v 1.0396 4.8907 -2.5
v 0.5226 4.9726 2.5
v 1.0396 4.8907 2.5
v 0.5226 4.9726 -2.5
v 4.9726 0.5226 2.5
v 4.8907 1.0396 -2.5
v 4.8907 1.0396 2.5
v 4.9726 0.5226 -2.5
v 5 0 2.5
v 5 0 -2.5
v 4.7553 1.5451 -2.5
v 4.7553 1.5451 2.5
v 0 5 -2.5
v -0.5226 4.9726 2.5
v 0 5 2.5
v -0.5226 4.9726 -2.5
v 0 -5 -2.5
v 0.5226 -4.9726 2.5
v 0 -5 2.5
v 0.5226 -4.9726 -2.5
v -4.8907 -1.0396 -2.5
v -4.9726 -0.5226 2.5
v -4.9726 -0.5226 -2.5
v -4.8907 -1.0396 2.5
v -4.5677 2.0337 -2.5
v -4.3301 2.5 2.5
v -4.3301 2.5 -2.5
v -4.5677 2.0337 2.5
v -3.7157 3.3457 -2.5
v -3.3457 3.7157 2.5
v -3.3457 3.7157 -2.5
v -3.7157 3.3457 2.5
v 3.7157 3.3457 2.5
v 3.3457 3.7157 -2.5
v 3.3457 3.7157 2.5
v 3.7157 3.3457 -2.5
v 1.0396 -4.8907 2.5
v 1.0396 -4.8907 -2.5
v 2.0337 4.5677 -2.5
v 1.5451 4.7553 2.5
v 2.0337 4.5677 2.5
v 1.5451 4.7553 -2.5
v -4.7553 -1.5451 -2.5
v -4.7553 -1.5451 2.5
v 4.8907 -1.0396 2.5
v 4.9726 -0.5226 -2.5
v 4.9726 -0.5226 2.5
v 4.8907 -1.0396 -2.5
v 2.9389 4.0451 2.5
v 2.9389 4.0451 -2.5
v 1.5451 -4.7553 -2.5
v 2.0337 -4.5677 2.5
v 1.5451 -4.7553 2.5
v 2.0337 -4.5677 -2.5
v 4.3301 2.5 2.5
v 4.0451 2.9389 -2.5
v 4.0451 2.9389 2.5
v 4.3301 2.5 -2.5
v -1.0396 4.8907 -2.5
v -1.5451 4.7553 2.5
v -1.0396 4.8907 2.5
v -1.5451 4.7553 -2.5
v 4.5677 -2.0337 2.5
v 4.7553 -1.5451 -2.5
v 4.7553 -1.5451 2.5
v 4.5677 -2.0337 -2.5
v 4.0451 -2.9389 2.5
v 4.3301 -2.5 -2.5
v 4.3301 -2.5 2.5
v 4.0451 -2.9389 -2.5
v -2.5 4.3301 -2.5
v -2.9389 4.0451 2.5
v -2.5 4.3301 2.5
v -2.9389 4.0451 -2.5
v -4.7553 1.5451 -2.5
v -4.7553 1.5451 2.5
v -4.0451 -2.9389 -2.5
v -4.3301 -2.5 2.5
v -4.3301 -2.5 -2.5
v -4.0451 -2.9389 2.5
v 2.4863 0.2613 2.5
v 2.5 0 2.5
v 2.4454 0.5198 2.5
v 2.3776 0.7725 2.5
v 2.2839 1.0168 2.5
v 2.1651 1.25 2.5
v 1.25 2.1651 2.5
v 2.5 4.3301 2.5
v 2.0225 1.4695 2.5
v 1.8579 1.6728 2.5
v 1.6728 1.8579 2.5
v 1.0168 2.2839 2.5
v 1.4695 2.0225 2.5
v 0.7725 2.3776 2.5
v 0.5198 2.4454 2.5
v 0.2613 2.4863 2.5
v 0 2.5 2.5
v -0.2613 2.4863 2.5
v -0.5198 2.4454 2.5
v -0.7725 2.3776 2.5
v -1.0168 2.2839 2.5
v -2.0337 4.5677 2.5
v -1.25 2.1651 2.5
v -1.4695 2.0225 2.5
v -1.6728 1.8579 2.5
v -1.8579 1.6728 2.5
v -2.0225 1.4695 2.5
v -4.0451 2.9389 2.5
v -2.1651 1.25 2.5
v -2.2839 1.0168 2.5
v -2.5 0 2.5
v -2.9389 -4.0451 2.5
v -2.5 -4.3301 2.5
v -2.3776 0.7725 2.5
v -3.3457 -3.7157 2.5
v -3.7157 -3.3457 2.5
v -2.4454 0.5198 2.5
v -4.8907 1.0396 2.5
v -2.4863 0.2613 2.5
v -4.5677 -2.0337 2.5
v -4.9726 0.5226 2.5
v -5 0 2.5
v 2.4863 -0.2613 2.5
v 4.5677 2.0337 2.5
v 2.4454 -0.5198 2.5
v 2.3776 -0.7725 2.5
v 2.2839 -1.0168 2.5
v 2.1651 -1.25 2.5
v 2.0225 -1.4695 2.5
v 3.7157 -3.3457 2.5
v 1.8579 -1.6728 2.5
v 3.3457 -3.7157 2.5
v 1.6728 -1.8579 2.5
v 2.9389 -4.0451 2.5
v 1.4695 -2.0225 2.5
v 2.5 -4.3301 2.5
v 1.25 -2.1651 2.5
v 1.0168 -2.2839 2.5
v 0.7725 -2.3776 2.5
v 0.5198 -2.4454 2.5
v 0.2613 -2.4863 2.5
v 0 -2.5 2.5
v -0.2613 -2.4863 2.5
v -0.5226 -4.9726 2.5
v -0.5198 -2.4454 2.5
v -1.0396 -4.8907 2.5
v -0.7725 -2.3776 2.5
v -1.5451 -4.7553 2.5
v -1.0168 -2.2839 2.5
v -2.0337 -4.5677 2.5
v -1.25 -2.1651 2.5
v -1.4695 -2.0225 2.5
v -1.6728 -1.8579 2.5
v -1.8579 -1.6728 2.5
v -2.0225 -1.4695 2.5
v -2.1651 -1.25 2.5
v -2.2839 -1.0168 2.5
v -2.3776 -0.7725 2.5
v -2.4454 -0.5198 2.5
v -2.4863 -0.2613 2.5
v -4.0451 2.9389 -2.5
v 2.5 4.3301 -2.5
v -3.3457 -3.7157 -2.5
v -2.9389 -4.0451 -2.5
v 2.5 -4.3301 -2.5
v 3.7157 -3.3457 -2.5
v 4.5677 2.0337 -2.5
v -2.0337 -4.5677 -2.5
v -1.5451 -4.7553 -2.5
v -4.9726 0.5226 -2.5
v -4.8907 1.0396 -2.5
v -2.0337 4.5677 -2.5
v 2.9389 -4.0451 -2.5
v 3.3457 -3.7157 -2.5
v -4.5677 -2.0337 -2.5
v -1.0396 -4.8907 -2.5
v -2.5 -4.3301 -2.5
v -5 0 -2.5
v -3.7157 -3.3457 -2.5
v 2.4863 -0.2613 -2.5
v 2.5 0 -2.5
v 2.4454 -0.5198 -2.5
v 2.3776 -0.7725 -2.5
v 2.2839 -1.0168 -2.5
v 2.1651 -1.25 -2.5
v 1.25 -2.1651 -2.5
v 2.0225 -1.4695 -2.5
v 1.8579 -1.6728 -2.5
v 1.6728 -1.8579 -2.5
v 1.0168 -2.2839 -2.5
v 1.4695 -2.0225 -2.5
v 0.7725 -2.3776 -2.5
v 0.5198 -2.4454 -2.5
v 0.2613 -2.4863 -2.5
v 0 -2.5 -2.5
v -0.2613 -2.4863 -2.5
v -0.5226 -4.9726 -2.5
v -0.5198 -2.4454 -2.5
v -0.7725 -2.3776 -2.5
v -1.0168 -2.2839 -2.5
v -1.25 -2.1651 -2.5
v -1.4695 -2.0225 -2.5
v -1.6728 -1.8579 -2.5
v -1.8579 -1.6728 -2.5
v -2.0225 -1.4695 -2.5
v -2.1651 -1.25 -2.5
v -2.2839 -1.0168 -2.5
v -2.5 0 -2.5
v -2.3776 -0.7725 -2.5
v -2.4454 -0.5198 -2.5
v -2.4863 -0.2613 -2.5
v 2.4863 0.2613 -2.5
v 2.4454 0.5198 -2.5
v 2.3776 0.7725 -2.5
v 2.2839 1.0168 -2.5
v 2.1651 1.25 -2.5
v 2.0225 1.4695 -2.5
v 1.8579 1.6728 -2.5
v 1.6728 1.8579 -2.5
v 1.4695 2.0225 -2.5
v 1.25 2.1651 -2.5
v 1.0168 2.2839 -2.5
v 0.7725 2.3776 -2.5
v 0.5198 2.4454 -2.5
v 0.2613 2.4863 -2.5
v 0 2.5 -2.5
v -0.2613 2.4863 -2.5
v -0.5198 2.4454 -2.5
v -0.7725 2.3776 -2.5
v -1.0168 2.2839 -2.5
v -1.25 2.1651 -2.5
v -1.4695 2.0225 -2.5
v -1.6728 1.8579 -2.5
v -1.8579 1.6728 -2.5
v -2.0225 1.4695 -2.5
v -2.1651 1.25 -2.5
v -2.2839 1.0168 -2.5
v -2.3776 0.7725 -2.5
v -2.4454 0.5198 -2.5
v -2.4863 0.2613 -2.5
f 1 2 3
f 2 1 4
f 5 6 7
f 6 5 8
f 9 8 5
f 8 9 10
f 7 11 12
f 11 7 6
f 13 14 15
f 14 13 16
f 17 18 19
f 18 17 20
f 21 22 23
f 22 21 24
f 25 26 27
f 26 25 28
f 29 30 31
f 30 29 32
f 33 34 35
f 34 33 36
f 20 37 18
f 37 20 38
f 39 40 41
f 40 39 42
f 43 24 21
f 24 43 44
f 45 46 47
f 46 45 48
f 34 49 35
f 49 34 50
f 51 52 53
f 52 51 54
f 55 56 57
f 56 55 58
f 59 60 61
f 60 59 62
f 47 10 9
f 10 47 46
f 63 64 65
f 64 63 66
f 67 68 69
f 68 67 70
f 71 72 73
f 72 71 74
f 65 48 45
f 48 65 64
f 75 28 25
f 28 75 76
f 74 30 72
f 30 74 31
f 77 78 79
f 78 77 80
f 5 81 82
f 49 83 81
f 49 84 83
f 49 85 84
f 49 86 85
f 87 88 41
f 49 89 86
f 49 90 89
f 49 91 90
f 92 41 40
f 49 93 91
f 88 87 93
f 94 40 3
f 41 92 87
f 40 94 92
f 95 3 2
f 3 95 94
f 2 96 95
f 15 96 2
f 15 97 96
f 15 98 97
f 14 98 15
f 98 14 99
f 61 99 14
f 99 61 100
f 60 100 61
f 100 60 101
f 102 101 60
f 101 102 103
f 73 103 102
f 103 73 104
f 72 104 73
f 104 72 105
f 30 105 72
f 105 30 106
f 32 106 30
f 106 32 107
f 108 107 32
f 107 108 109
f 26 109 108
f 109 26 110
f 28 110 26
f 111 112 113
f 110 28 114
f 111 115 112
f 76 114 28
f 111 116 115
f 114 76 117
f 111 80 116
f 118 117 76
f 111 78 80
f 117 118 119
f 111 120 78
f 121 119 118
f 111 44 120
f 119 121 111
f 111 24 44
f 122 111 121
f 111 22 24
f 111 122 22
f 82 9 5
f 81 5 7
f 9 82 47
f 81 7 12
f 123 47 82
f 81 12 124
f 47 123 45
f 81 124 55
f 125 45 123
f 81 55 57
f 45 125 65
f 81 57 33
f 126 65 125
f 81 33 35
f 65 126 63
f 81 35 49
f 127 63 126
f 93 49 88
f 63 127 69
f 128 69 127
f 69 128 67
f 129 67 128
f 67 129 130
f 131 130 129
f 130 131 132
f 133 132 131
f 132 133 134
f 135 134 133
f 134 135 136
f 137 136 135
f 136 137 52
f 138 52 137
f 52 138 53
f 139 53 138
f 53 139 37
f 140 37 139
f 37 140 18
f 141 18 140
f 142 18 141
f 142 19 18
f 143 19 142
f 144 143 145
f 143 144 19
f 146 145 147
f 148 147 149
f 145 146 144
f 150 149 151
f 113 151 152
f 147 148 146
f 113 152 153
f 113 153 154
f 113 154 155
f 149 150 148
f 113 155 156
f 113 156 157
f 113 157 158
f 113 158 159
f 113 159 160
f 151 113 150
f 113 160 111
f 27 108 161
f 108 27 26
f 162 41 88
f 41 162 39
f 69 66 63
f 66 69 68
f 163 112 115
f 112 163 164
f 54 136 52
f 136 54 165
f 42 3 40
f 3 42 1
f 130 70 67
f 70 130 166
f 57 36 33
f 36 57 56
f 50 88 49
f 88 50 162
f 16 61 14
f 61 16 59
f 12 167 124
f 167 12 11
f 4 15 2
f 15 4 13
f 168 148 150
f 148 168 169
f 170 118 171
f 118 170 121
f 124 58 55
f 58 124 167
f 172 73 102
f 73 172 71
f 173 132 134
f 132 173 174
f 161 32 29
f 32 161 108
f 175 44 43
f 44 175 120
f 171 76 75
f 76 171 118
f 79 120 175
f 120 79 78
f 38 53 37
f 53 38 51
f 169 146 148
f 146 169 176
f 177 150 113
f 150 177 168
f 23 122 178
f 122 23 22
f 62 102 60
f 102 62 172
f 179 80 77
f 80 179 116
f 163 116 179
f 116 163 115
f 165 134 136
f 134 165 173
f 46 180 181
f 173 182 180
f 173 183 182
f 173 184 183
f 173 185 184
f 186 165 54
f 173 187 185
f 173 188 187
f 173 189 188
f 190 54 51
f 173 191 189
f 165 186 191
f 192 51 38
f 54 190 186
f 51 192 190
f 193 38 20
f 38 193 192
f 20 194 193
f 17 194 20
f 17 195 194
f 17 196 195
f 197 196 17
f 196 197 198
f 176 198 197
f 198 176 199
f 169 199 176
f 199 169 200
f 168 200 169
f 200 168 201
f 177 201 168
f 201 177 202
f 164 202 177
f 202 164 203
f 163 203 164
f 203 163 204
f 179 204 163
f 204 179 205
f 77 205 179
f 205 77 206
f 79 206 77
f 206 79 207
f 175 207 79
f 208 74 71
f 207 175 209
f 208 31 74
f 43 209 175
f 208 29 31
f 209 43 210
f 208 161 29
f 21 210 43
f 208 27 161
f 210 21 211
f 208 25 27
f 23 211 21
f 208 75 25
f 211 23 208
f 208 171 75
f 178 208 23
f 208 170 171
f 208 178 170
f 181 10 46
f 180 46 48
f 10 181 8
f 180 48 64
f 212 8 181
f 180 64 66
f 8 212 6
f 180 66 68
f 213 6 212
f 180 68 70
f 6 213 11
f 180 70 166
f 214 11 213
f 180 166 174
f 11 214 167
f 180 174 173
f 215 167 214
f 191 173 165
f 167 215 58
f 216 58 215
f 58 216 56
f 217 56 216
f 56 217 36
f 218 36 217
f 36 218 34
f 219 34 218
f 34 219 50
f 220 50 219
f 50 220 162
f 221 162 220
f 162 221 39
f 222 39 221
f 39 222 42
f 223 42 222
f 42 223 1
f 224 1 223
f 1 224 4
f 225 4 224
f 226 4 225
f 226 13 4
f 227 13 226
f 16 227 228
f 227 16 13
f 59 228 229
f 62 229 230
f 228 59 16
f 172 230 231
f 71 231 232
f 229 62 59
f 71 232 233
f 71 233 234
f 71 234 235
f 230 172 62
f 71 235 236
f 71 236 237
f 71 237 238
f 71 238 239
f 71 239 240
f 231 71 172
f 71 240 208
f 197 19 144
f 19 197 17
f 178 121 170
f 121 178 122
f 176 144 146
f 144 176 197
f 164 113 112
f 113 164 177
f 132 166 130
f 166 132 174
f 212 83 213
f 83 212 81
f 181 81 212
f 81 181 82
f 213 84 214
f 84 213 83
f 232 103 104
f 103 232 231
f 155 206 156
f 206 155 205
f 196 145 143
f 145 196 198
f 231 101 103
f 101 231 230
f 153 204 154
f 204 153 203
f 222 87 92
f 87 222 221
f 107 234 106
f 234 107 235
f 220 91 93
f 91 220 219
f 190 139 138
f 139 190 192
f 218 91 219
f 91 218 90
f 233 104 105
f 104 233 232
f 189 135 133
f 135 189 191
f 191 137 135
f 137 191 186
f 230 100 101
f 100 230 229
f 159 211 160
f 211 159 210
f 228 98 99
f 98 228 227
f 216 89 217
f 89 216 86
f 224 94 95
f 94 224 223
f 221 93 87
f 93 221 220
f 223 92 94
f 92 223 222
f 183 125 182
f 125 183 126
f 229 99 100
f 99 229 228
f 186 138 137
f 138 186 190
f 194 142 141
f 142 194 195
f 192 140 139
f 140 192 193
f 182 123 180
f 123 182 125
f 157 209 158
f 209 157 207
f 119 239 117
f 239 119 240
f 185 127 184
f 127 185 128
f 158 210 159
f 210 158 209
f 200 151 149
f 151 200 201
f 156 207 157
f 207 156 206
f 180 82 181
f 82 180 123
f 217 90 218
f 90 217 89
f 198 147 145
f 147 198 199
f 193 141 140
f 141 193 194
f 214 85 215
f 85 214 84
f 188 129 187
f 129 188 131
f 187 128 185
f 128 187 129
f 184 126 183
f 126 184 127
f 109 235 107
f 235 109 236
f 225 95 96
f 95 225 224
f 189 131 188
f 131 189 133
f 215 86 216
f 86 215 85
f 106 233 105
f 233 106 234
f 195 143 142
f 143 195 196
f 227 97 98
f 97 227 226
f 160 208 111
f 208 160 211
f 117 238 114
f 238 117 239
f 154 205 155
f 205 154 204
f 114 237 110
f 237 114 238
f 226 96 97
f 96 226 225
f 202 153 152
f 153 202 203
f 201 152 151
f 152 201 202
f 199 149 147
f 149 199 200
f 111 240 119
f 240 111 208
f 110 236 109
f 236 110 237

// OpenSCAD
/* Simple Bushings for 3D printing
   Charles Tilford, 2019
   License: CC BY-NC-SA 4.0
   https://creativecommons.org/licenses/by-nc-sa/4.0/
*/

/*
  A cylindrical bushing / spacer. Basically a cylinder
  with a cylindrical hole through the middle.

  The idea here is to define a set of bushings with a
  fixed RATIO between the inner diameter of the hole
  and the outer diameter of the cylinder as a whole.
  You can then define specic sizes (total width and
  height) by scaling in your slicing program.

  OI ratio of 1 = 100% hole (no object)
  Squat + high OI ratio = washer
  Tall + low ratio = pipe.
*/

/* The ratio below is really the the thickness of the
   outer wall and the inner diameter. So a value of 2
   means that the outer wall is twice as thick as the
   diameter of the inner hole, for a total width of
   5 (2+1+2) and a total radius of 2.5
*/
OIratio=2;

height=5;  // Height of cylinder, arbitrary units
ID=5;      // Inner diameter
FN=60;     // Number of features for cylinder.
           //   more = smoother

/* Thin floor below holes. My printer was
   struggling to have the hole 'border' stick
   to the stage for some prints.Just drill/screw thru it.
   Set to zero for no floor.
*/
holeFloor=0; 

// ==========================================
// ===== All values below are auto-calculated
// ==========================================

OD=ID * OIratio; // Outer diameter
echo(str("Cylinder ID=",ID,", OD=",OD,", H=",height));

difference() {
  // We use difference() to punch out the inner hole
    
  // The overall cylinder
  translate([0,0,0])
    cylinder(d=OD, h=height, center=true, $fn=FN);
    
  // The hole in the middle
  translate([0,0,holeFloor]) color("red")
    cylinder(d=ID, h=height + 0.2, center=true, $fn=FN);
}

// Colors are just to aid visualization of
// void spaces.

// Developed in OpenSCAD
//    https://www.openscad.org/
